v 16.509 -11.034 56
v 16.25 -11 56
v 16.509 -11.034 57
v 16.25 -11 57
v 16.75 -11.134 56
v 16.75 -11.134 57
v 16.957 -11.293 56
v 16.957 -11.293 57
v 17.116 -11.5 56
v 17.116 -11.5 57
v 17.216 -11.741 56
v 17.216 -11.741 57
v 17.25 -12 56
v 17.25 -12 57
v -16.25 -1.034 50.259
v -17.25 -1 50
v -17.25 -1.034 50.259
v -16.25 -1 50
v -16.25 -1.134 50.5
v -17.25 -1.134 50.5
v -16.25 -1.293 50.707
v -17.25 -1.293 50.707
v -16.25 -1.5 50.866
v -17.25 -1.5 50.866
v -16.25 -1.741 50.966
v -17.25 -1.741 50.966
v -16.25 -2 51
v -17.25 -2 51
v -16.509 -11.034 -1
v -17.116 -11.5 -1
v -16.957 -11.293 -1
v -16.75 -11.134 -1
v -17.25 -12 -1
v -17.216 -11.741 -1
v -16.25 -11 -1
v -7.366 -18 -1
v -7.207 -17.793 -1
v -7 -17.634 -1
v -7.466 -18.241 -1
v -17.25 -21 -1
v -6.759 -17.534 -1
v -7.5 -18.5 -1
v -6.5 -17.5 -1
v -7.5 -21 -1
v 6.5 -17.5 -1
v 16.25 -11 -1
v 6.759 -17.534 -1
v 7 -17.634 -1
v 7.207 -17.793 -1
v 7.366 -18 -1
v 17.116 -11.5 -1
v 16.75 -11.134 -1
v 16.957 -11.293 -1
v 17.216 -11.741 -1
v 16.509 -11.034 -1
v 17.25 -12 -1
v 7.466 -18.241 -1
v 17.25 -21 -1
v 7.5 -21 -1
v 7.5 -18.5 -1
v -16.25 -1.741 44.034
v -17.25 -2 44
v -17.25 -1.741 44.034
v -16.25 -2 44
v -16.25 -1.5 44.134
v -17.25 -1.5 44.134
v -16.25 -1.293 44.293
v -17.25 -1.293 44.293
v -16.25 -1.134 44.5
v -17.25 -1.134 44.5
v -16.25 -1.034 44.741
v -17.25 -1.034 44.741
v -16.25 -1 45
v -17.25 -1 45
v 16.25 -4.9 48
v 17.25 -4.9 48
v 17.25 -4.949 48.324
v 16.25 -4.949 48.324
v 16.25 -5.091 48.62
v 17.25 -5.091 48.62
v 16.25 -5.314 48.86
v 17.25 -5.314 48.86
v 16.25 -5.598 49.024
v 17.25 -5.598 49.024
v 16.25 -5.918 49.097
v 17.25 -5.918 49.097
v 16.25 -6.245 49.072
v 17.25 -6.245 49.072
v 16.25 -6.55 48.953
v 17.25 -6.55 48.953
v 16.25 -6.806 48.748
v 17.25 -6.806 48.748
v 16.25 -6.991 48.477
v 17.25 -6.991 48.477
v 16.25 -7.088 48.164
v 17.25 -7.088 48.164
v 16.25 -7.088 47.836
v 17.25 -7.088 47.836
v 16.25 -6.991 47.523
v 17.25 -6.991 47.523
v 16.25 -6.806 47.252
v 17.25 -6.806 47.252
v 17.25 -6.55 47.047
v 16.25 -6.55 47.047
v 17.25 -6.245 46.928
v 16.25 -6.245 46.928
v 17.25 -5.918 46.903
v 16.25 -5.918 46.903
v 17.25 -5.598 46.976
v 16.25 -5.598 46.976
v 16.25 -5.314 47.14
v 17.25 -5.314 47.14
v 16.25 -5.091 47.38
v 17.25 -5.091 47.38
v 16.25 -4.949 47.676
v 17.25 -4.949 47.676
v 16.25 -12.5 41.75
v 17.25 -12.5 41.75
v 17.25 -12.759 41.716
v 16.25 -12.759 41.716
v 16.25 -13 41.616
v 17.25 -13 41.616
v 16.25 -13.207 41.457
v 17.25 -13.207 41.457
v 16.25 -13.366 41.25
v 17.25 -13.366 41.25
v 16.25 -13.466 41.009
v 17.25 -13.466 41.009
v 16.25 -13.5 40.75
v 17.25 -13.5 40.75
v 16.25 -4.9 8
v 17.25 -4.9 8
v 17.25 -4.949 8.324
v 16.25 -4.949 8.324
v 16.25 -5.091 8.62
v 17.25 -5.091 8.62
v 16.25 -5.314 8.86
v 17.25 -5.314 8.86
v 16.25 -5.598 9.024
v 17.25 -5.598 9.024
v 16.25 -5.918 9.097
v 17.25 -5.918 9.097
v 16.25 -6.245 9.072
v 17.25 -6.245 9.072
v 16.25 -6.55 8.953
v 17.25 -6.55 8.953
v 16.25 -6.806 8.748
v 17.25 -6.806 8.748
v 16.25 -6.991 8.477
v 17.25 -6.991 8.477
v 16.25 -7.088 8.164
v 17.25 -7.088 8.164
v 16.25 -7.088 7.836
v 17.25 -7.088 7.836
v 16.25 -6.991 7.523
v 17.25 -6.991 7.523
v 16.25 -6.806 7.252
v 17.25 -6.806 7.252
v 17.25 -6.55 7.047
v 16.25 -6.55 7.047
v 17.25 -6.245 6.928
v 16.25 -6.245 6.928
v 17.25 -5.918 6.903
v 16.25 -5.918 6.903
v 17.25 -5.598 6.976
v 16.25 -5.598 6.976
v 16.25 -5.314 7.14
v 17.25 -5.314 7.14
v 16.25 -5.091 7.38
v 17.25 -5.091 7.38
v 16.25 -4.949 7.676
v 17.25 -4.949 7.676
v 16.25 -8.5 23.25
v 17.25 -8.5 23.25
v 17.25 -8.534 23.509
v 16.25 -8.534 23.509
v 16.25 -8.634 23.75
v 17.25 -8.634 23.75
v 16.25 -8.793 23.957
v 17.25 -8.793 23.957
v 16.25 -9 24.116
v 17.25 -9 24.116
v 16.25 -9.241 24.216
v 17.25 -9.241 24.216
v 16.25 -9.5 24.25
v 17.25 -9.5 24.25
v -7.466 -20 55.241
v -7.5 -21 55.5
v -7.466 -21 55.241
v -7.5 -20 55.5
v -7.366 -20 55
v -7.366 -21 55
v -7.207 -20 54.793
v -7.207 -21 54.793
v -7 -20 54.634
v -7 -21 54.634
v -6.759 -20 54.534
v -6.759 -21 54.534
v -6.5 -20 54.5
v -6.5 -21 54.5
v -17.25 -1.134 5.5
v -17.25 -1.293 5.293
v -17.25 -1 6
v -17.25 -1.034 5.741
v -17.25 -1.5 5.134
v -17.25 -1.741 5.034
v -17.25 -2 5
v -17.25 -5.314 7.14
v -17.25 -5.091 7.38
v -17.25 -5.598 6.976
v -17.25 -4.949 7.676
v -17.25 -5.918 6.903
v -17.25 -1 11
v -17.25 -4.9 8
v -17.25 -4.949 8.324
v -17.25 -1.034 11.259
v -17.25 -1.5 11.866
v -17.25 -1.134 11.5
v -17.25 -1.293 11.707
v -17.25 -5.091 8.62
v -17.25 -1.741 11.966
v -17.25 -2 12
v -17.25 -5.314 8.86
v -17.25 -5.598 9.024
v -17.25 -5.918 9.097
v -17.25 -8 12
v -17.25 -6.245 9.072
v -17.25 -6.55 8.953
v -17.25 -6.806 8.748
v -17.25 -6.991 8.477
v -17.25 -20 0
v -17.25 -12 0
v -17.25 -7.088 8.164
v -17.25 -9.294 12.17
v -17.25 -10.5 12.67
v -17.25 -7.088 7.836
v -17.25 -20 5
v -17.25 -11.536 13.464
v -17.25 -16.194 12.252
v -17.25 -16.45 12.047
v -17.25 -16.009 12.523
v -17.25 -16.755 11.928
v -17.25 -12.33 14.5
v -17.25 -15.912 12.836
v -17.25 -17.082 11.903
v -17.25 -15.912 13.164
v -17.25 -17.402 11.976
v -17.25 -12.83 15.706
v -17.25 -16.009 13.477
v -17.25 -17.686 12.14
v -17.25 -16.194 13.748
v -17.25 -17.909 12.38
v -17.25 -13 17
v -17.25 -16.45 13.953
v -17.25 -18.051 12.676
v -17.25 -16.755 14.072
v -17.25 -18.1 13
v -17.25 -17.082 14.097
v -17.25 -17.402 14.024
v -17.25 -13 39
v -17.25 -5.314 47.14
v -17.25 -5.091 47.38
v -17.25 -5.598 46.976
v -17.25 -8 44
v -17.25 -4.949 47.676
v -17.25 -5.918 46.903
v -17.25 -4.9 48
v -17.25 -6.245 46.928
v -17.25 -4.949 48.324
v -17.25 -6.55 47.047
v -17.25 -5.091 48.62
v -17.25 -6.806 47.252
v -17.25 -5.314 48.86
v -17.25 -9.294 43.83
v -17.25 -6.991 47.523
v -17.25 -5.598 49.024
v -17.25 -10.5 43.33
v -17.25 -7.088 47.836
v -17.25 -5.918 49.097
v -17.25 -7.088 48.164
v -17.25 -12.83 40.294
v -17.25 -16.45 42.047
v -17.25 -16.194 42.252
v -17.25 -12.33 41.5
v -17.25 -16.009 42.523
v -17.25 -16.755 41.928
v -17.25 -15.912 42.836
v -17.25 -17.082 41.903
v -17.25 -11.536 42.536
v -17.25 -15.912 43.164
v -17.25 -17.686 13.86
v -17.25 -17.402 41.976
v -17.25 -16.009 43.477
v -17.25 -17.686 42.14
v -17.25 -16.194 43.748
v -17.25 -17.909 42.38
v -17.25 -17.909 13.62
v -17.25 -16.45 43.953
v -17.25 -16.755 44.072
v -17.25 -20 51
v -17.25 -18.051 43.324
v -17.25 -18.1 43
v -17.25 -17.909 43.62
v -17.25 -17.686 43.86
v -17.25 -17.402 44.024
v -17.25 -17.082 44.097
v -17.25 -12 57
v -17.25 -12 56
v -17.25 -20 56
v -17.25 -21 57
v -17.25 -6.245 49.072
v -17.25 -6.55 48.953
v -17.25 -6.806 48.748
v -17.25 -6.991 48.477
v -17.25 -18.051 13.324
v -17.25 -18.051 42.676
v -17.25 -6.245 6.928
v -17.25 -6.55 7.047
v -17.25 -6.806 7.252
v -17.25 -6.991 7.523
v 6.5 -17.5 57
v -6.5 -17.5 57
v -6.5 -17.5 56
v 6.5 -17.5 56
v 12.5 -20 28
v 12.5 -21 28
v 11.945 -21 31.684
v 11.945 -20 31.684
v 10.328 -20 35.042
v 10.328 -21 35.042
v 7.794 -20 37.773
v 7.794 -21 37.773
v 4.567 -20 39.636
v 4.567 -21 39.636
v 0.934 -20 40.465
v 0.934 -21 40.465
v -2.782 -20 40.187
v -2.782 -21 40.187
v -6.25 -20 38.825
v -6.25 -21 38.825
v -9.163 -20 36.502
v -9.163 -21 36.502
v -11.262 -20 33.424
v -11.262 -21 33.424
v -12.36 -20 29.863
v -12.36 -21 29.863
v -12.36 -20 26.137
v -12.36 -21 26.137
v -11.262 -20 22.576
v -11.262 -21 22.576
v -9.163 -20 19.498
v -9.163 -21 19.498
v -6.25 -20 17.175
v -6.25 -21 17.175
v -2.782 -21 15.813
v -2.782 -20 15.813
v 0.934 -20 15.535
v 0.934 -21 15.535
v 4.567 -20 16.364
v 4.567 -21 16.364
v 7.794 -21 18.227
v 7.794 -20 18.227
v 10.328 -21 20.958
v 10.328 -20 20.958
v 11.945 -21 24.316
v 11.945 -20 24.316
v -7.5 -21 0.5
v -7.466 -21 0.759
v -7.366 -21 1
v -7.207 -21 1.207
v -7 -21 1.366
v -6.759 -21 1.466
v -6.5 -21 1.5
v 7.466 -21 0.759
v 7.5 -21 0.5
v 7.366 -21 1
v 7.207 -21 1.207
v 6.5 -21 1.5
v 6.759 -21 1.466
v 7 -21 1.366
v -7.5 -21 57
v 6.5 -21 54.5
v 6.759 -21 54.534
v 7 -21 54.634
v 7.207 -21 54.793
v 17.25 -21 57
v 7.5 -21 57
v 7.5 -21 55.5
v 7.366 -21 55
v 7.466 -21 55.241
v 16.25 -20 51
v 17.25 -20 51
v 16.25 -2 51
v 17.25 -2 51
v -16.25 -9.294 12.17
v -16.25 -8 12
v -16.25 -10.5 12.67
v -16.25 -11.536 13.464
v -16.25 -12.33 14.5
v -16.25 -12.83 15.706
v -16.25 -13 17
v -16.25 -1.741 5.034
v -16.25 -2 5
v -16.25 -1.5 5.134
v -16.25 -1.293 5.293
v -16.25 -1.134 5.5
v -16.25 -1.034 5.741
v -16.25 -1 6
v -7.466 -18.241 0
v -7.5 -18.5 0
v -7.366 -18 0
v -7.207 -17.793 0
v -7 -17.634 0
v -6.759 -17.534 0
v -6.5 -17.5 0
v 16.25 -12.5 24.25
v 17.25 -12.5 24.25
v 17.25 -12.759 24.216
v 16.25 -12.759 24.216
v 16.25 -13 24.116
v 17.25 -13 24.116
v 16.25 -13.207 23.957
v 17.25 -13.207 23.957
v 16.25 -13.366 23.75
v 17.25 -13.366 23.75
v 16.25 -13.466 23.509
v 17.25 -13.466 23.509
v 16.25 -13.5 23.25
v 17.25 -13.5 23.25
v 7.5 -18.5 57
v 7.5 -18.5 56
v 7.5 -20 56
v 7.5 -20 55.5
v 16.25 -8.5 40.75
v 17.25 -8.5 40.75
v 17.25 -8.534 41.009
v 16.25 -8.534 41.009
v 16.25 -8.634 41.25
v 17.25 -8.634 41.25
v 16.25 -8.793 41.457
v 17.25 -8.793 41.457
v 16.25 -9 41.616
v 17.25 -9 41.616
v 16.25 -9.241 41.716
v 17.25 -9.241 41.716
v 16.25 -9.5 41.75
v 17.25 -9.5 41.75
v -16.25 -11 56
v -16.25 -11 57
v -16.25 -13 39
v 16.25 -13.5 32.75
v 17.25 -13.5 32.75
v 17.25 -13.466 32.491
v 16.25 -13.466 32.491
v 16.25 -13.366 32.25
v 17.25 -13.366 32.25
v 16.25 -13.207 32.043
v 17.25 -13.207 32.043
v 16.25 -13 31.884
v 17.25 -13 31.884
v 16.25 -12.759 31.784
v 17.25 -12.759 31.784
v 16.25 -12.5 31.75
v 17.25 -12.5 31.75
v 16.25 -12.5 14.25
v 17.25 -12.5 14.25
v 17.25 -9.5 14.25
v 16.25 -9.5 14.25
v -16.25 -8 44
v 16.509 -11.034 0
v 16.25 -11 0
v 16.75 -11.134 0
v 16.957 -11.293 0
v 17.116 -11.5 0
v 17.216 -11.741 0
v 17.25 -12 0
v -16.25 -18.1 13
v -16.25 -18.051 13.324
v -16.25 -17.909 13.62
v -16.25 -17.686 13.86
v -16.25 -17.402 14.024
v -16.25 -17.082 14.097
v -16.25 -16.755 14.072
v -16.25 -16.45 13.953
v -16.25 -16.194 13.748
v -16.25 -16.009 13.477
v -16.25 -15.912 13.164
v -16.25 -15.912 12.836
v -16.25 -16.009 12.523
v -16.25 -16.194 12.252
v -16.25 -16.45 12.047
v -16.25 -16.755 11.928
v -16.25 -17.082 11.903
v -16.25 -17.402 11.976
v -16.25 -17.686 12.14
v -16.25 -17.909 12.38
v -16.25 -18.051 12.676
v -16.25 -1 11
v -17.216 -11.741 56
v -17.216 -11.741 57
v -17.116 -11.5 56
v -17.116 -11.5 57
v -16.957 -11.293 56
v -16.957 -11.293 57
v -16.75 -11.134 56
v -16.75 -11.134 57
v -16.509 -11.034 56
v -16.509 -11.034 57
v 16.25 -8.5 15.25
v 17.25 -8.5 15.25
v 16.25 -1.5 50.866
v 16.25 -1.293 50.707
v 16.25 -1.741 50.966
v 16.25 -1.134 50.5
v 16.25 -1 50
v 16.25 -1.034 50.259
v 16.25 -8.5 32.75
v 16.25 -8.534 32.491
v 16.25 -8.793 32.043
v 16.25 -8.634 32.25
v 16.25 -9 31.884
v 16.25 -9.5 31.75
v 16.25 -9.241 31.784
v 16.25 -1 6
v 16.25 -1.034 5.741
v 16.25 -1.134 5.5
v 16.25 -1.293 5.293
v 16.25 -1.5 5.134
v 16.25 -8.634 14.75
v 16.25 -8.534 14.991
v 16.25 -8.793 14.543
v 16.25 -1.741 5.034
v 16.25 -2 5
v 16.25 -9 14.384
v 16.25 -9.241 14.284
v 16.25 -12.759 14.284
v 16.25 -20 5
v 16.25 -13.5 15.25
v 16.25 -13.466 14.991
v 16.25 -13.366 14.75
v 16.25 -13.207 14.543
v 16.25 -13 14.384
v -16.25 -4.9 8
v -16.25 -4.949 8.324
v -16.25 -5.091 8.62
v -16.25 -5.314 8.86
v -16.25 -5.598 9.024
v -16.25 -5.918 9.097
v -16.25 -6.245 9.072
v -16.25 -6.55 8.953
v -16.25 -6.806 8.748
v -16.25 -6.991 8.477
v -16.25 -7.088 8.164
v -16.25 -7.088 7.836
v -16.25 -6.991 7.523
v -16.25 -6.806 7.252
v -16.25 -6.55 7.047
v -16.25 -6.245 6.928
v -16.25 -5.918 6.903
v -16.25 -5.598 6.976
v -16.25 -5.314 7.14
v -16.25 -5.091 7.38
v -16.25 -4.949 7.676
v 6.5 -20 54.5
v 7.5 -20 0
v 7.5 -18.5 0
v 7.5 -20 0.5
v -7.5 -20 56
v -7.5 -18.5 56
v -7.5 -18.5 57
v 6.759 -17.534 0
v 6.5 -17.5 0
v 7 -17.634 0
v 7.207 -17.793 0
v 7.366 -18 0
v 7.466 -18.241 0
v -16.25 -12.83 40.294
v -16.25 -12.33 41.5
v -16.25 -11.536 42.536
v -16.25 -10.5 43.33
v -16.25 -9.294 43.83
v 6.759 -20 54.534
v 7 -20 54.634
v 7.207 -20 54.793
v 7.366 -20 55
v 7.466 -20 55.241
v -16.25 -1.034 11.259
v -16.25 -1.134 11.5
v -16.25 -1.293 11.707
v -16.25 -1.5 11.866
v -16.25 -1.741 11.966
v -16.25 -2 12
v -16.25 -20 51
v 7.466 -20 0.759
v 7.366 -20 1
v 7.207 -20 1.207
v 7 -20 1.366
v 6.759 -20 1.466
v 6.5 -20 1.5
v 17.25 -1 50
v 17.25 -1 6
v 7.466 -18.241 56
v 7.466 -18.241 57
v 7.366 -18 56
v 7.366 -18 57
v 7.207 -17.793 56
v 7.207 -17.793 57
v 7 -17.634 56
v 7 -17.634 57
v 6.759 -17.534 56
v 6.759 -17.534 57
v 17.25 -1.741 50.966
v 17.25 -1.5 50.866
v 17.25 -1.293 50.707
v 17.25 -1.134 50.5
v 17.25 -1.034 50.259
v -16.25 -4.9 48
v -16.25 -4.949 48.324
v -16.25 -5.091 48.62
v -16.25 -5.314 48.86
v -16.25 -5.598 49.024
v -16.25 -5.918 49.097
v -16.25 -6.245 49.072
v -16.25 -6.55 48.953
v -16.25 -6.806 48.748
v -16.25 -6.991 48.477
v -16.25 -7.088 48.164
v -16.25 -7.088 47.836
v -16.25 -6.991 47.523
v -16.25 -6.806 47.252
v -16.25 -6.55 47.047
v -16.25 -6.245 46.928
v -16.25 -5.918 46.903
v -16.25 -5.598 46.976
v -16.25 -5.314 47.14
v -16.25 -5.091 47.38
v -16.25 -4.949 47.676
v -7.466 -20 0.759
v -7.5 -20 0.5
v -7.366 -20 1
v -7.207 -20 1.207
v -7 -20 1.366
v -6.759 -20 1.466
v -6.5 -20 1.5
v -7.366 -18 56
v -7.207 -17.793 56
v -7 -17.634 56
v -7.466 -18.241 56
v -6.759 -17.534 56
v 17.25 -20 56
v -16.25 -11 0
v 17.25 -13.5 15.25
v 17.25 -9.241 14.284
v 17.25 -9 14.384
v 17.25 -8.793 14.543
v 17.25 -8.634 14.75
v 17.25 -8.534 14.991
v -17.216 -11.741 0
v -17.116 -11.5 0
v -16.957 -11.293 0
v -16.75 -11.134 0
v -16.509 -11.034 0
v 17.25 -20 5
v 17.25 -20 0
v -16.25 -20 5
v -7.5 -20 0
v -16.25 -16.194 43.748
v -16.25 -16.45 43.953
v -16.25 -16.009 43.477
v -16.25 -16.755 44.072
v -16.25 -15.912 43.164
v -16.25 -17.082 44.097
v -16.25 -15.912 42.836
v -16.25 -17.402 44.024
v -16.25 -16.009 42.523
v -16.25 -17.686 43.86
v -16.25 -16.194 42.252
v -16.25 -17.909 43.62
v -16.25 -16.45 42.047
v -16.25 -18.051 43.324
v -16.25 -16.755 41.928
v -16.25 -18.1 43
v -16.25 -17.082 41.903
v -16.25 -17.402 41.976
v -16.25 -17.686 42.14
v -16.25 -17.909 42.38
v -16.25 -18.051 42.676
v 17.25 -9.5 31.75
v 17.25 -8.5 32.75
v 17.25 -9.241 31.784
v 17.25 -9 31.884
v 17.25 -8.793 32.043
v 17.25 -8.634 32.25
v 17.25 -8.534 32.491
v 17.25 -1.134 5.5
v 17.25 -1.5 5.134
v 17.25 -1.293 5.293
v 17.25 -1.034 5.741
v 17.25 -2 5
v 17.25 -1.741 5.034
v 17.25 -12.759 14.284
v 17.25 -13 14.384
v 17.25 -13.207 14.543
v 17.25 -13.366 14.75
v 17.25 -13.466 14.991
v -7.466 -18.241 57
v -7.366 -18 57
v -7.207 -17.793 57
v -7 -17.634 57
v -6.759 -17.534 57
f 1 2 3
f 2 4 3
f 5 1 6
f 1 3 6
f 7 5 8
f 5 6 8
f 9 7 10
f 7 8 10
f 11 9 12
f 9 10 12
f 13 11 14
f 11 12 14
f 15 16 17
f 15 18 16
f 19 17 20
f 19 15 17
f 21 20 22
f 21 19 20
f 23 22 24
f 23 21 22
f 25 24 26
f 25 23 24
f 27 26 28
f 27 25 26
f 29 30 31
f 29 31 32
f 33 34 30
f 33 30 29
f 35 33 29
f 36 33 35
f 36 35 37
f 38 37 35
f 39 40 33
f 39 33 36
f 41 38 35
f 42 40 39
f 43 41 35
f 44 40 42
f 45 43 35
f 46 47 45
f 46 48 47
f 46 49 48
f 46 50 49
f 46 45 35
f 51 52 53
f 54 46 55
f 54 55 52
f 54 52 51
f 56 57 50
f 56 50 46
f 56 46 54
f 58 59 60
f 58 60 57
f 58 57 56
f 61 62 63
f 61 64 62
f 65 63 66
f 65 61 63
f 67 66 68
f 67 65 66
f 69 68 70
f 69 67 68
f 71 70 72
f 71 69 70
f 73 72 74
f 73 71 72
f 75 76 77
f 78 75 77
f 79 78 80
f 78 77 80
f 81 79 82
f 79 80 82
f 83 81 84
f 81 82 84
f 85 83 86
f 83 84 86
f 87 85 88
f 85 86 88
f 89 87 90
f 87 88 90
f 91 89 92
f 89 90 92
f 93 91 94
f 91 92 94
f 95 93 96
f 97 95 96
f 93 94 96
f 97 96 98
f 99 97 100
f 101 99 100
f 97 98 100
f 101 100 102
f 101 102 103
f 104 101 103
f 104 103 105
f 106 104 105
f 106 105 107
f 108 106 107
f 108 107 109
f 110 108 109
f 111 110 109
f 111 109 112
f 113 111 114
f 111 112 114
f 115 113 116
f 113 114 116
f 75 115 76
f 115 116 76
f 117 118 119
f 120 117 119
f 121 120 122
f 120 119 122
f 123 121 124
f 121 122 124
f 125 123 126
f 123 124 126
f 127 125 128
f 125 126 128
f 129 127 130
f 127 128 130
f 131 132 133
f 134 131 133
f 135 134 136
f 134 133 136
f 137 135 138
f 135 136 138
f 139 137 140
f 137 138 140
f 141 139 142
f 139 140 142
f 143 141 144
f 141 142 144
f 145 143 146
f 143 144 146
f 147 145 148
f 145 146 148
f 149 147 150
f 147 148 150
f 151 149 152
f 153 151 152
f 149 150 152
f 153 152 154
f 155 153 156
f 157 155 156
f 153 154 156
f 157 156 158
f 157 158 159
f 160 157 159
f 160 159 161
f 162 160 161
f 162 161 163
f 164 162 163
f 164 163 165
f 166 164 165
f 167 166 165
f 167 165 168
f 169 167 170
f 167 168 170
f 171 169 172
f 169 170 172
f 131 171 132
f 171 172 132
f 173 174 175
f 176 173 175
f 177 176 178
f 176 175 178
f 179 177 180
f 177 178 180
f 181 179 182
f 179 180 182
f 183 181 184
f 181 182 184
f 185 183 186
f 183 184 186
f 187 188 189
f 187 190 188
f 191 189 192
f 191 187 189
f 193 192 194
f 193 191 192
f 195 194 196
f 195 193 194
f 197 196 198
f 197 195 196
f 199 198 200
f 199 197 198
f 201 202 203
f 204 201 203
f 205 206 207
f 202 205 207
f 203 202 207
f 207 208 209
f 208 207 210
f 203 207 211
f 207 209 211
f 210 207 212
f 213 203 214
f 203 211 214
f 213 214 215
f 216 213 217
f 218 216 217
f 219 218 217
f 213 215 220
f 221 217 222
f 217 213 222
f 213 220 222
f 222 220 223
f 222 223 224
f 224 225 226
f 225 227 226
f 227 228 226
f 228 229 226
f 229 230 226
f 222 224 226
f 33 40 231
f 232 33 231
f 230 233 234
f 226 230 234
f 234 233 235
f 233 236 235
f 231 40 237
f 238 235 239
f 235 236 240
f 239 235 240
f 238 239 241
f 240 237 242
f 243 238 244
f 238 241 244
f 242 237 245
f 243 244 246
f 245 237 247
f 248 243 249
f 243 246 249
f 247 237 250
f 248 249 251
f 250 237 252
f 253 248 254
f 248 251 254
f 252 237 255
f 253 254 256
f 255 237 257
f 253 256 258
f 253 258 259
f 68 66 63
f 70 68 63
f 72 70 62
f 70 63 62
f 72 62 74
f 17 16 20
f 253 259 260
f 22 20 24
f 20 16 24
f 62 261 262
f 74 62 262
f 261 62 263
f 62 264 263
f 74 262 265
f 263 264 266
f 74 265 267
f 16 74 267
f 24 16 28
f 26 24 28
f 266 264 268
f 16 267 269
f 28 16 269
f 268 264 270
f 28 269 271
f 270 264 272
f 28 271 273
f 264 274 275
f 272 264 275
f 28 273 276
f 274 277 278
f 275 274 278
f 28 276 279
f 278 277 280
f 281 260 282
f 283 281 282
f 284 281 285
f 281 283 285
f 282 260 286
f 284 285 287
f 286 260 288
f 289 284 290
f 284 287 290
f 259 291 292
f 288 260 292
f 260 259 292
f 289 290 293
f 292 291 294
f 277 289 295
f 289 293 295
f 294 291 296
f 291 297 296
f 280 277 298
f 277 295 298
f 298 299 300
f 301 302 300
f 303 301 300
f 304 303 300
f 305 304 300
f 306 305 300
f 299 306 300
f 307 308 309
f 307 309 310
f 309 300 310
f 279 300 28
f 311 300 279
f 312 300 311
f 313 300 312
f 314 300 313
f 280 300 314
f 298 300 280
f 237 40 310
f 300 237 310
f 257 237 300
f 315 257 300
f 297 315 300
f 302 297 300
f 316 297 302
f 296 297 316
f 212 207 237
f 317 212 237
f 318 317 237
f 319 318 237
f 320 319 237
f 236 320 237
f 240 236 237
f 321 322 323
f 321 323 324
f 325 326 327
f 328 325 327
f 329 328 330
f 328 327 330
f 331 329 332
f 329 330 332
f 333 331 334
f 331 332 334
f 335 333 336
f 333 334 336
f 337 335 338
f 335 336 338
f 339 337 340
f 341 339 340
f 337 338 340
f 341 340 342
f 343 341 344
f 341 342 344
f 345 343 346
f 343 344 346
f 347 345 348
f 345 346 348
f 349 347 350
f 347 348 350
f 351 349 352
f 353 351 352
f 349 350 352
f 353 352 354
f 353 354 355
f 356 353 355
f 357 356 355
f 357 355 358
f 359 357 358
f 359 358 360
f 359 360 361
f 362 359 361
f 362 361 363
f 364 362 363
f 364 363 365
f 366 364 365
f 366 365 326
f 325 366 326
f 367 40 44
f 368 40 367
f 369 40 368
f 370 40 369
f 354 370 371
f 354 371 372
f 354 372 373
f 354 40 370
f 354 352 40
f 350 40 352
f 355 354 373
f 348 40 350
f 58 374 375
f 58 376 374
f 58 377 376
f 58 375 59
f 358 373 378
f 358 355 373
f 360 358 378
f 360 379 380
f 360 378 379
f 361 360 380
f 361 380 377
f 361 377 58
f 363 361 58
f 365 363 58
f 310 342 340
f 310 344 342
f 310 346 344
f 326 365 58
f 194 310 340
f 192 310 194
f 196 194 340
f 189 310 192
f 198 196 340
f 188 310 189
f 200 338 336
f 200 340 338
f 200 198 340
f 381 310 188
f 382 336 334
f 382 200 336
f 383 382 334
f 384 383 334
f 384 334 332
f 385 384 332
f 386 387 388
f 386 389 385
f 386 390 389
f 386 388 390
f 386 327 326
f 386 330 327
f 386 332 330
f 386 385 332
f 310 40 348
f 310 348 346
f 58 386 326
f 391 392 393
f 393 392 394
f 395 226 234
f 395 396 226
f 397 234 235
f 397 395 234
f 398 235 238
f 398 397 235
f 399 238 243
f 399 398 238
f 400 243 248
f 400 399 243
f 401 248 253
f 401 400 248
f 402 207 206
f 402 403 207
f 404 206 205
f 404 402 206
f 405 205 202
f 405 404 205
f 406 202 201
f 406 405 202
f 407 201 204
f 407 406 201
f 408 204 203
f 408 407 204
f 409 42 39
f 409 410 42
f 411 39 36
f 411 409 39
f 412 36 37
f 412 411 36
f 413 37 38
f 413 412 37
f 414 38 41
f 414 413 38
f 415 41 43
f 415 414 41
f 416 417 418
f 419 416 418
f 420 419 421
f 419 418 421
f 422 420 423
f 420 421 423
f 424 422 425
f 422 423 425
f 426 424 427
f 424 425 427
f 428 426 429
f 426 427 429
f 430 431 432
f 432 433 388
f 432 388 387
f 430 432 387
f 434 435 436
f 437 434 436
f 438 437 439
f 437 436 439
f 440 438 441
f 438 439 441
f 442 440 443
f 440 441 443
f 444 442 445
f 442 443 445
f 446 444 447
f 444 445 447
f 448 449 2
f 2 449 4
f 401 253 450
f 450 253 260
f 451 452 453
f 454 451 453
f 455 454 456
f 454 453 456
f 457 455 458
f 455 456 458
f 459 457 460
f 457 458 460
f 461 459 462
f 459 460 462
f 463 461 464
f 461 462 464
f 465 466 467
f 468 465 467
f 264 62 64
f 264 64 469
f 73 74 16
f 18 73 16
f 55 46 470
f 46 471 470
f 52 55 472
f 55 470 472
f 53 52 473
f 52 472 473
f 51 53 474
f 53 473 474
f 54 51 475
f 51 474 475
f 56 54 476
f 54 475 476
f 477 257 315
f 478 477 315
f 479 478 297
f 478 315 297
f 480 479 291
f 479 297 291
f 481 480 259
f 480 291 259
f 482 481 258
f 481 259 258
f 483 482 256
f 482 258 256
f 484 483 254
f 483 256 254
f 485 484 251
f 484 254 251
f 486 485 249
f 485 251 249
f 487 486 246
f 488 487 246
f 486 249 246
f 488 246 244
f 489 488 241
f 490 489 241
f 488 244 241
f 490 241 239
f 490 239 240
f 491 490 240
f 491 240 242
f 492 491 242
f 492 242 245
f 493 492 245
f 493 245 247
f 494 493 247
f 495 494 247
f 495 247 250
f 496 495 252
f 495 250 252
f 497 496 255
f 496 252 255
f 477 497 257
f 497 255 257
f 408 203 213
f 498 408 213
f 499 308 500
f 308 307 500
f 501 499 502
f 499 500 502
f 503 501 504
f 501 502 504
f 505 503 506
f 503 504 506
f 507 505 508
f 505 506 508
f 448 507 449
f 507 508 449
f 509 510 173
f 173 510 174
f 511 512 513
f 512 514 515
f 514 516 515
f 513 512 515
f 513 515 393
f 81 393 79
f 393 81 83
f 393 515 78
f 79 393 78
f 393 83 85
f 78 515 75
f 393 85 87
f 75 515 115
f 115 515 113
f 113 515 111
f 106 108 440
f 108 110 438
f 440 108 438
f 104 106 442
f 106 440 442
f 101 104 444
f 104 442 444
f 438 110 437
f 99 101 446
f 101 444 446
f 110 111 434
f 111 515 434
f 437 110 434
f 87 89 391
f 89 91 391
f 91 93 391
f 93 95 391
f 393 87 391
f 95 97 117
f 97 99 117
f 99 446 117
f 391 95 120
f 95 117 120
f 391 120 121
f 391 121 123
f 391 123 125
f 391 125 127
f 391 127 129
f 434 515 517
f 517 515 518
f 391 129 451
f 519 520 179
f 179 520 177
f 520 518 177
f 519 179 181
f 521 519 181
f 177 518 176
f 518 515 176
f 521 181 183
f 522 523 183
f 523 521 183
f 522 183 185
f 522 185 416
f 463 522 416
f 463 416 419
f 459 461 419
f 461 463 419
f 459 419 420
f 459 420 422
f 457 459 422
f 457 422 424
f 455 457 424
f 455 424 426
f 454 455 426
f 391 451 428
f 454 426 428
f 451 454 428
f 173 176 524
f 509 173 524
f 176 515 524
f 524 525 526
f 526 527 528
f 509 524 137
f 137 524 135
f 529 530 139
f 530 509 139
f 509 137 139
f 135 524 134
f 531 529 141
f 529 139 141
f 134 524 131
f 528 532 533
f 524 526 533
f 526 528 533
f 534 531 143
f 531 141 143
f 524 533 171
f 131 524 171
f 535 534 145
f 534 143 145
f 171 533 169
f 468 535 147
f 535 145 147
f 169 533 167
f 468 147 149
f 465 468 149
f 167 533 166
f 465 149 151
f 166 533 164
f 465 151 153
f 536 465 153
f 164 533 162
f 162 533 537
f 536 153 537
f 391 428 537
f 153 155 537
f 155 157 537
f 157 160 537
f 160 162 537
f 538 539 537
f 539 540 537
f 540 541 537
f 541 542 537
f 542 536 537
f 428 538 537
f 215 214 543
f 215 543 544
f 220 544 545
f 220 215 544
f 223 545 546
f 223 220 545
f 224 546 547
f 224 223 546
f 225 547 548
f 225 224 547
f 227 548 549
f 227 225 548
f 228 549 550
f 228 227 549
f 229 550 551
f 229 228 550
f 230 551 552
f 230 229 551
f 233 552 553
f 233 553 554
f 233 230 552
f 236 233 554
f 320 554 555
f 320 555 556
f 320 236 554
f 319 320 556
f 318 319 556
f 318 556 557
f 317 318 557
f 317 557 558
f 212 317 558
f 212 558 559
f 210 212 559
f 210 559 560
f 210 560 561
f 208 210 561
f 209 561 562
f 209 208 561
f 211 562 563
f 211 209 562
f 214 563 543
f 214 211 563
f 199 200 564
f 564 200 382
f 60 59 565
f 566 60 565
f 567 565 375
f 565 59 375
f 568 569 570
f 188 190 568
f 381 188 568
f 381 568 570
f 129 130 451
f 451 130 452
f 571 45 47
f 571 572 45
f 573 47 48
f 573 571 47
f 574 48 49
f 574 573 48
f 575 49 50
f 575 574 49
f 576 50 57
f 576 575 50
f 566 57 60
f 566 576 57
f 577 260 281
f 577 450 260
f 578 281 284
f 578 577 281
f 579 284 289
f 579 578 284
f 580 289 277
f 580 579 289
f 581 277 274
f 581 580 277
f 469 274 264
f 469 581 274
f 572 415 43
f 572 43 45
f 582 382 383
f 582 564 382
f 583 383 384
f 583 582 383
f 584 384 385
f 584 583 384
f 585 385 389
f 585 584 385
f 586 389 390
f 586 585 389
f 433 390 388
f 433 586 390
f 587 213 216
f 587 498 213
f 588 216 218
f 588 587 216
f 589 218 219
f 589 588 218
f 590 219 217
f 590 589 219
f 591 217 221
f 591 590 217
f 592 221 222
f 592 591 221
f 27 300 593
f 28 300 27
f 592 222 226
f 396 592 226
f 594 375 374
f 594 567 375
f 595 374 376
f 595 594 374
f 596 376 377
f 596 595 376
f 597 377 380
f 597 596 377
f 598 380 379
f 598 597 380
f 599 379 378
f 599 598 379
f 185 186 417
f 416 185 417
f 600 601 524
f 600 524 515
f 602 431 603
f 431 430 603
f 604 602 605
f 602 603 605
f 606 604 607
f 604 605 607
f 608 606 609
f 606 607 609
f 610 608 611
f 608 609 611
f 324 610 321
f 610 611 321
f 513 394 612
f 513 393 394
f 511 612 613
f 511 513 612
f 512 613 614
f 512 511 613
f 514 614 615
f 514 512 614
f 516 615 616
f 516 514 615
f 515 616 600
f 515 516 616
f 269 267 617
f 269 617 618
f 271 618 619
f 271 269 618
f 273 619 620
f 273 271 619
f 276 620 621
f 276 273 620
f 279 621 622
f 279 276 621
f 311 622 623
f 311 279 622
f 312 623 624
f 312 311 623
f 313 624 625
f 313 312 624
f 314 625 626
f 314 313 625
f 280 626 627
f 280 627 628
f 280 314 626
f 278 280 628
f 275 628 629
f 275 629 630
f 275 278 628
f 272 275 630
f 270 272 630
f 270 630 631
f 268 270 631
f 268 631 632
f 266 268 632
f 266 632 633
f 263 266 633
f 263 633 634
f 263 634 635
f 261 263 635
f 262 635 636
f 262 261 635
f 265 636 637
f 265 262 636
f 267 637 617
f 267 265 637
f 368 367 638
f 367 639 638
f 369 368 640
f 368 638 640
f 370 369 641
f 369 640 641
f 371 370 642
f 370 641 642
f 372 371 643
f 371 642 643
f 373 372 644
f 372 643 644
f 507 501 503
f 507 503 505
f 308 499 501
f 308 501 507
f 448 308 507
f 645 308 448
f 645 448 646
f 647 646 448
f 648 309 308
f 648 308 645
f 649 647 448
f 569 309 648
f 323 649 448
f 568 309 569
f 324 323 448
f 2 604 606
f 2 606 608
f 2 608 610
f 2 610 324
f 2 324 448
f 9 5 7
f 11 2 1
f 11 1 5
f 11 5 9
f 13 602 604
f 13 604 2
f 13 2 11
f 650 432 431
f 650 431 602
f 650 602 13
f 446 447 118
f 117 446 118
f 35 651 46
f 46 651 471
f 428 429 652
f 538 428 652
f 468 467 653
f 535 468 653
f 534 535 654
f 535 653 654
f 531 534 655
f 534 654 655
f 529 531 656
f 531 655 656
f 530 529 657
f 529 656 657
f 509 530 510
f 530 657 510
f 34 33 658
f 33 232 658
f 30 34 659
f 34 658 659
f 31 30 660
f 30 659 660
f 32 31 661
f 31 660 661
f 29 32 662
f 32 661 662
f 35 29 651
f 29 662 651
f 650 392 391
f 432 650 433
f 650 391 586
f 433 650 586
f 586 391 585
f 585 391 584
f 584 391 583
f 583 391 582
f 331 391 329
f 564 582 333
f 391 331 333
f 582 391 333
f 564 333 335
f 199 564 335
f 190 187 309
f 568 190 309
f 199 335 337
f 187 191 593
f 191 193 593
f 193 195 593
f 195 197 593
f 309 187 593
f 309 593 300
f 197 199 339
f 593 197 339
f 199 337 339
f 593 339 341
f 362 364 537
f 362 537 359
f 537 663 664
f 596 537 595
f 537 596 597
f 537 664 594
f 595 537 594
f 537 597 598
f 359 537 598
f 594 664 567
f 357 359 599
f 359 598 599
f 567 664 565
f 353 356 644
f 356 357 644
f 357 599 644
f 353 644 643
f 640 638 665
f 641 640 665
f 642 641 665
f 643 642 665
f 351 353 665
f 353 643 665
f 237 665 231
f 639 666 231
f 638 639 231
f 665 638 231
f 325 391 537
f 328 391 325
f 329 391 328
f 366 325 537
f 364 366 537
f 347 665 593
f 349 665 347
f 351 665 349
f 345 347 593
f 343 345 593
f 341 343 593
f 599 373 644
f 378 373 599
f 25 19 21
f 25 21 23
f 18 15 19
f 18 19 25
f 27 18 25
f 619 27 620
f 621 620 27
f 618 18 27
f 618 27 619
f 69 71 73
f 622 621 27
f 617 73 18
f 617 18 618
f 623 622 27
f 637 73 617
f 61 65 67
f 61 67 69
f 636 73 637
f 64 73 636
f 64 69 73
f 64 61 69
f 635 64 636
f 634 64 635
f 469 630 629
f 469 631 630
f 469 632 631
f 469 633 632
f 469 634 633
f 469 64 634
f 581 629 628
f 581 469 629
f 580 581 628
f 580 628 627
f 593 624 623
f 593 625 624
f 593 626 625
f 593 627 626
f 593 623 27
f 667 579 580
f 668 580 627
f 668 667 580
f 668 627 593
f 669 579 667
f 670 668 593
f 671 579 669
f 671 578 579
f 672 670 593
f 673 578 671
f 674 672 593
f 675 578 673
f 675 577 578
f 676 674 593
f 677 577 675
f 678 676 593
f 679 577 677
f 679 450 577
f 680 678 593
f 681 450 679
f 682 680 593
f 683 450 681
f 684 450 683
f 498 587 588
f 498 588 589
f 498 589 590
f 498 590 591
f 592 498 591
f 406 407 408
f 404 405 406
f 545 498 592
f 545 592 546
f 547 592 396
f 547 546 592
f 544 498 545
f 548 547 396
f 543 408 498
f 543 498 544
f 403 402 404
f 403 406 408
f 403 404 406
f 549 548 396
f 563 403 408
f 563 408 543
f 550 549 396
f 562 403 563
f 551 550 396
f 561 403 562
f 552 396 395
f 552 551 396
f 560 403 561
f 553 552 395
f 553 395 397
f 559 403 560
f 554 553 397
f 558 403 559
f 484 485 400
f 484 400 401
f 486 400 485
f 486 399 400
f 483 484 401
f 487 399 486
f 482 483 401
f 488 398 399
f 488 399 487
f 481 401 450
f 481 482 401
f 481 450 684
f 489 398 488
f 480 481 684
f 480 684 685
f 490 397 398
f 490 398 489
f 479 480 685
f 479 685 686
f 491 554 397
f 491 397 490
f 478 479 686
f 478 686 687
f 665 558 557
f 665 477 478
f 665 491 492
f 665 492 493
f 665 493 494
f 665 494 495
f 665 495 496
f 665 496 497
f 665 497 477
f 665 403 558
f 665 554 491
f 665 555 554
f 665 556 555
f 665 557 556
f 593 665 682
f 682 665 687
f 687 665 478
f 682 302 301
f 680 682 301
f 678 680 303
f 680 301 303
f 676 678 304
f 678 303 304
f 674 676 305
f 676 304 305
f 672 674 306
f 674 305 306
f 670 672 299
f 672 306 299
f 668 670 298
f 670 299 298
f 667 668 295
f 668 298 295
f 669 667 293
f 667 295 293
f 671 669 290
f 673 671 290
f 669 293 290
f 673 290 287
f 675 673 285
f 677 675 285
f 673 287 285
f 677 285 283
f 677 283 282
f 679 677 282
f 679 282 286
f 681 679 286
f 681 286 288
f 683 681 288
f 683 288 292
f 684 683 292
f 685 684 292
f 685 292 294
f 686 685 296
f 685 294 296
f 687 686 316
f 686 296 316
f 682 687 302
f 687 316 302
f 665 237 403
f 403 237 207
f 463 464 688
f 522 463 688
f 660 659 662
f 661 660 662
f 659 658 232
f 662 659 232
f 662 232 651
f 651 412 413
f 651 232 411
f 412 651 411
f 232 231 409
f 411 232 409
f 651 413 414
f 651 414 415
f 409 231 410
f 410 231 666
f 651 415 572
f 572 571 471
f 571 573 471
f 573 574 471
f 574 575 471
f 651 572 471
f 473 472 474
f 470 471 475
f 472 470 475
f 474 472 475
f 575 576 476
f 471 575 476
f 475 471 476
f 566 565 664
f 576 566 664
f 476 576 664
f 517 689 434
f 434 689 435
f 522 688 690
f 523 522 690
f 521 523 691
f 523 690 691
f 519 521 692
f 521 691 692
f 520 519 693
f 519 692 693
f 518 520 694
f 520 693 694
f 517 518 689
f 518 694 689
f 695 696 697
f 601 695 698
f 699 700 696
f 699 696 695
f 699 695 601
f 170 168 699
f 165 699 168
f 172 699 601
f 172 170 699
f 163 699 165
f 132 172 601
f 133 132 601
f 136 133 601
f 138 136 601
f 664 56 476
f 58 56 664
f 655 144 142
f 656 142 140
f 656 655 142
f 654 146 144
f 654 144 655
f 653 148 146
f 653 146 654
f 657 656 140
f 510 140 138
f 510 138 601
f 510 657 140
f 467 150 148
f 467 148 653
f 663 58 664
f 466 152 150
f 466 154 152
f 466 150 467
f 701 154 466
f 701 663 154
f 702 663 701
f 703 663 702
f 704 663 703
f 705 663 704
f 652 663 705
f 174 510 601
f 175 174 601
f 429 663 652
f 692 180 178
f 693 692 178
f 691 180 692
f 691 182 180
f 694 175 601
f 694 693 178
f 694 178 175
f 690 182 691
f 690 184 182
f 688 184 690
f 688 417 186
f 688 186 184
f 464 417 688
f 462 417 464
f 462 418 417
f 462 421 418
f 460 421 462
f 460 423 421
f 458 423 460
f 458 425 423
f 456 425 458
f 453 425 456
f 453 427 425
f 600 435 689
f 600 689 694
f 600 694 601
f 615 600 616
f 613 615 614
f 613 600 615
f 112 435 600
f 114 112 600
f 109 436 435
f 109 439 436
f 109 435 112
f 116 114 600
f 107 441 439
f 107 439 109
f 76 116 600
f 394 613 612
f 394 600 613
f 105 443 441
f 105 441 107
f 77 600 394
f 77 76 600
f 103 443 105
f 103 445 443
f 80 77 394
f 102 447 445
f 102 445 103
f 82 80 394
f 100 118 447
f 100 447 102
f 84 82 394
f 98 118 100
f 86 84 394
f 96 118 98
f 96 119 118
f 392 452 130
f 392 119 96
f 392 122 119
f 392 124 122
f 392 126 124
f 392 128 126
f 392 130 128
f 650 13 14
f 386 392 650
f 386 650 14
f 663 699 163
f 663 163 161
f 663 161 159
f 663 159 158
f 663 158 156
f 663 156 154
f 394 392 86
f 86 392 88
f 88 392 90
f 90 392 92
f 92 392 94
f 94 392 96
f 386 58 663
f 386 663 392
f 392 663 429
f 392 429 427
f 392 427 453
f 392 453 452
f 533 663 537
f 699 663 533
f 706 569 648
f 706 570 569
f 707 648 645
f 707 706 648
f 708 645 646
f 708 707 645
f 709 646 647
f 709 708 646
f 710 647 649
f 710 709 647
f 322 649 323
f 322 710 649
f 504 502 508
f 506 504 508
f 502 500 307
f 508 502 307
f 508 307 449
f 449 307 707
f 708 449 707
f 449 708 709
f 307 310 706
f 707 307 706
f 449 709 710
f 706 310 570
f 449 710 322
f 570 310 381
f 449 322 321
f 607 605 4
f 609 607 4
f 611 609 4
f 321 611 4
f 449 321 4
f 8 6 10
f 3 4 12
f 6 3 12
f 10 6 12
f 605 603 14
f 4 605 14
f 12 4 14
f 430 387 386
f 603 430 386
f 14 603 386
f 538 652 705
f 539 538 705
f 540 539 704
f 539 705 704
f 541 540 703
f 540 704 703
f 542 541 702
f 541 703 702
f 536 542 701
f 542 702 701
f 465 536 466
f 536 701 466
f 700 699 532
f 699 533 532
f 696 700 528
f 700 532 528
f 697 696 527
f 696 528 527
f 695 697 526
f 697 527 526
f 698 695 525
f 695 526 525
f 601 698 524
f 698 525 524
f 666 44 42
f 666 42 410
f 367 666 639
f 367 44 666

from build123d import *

# Parameters (mm, degrees)
F1_DEPTH  = 56
F2_W      = 4
F2_H      = 38
F2_R      = 1.1
F2_R_2    = 12.5
F3_DEPTH  = 1
F4_W      = 21
F4_H      = 56
F4_R      = 1.1
F5_DEPTH  = 1
F6_W      = 20
F6_H      = 5
F7_DEPTH  = 1
F8_W      = 36
F8_H      = 38
F9_DEPTH  = 1
F11_R     = 1.1
F11_W     = 12
F11_H     = 32
F12_DEPTH = 1
F13_W     = 34.5
F13_H     = 1
F14_DEPTH = 10
F15_R     = 12.5
F15_W     = 15
F15_H     = 5
F16_DEPTH = 3.5
F18_DEPTH = 1
F19_R     = 1
F20_R     = 5


with BuildPart() as f1:
    # F0 (on Top) → F1 (new body)
    with BuildSketch(Plane.XY):
        Polygon((16.25, -20), (-16.25, -20), (-16.25, 20), (-17.25, 20), (-17.25, -21), (17.25, -21), (17.25, 20), (16.25, 20), align=None)
    extrude(amount=F1_DEPTH)

    # F2 (on face) → F3 (cut, through all)
    with BuildSketch(Plane(origin=(-17.25, 0, 0), x_dir=(0, -1, 0), z_dir=(-1, 0, 0))):
        Polygon((-20, 0), (20, 0), (20, 9), (-16, 9), (-20, 9), align=None)
        with Locations((-18, 28)):
            Rectangle(F2_W, F2_H)
        Polygon((-20, 56), (-20, 47), (-16, 47), (20, 47), (20, 56), align=None)
        with Locations((18, 43)):
            Circle(F2_R)
        with Locations((-12, 43)):
            Circle(F2_R)
        with Locations((-12, 13)):
            Circle(F2_R)
        with Locations((18, 13)):
            Circle(F2_R)
        with Locations((3, 28)):
            Circle(F2_R_2)
    extrude(amount=-F3_DEPTH, mode=Mode.SUBTRACT)

    # F4 (on face) → F5 (cut, through all)
    with BuildSketch(Plane.YZ.offset(17.25)):
        with Locations((9.5, 28)):
            Rectangle(F4_W, F4_H)
        with Locations((-6, 8)):
            Circle(F4_R)
        with Locations((-6, 48)):
            Circle(F4_R)
    extrude(amount=-F5_DEPTH, mode=Mode.SUBTRACT)

    # F6 (on face) → F7 (cut)
    with BuildSketch(Plane.YZ.offset(17.25)):
        with Locations((-11, 2.5)):
            Rectangle(F6_W, F6_H)
        with Locations((-11, 53.5)):
            Rectangle(F6_W, F6_H)
    extrude(amount=-F7_DEPTH, mode=Mode.SUBTRACT)

    # F8 (on face) → F9 (cut)
    with BuildSketch(Plane(origin=(-17.25, 0, 0), x_dir=(0, -1, 0), z_dir=(-1, 0, 0))):
        with Locations((2, 28)):
            Rectangle(F8_W, F8_H)
    extrude(amount=-F9_DEPTH, mode=Mode.SUBTRACT)

    # F10: F1 across plane


with BuildPart() as f1_1:
    add(f1.part)
    add(f1.part.mirror(Plane.YZ))

    # F11 (on face) → F12 (cut, through all)
    with BuildSketch(Plane(origin=(-17.25, 0, 0), x_dir=(0, -1, 0), z_dir=(-1, 0, 0))):
        with Locations((17, 43)):
            Circle(F11_R)
        with Locations((17, 13)):
            Circle(F11_R)
        with Locations((7, 28)):
            Rectangle(F11_W, F11_H)
    extrude(amount=-F12_DEPTH, mode=Mode.SUBTRACT)

    # F13 (on face) → F14 (join)
    with BuildSketch(Plane.XZ.offset(21)):
        with Locations((0, -0.5)):
            Rectangle(F13_W, F13_H)
        with Locations((0, 56.5)):
            Rectangle(F13_W, F13_H)
    extrude(amount=-F14_DEPTH)

    # F15 (on face) → F16 (cut)
    with BuildSketch(Plane.XZ.offset(21)):
        with Locations((0, 28)):
            Circle(F15_R)
        with Locations((0, 57)):
            Rectangle(F15_W, F15_H)
        with Locations((0, -1)):
            Rectangle(F15_W, F15_H)
    extrude(amount=-F16_DEPTH, mode=Mode.SUBTRACT)

    # F17 (on face) → F18 (cut, through all)
    with BuildSketch(Plane.YZ.offset(17.25)):
        with BuildLine():
            ThreePointArc((-13.5, 15.25), (-13.2071067812, 14.5428932188), (-12.5, 14.25))
            Line((-12.5, 14.25), (-9.5, 14.25))
            ThreePointArc((-9.5, 14.25), (-8.7928932188, 14.5428932188), (-8.5, 15.25))
            Line((-8.5, 15.25), (-8.5, 23.25))
            ThreePointArc((-8.5, 23.25), (-8.7928932188, 23.9571067812), (-9.5, 24.25))
            Line((-9.5, 24.25), (-12.5, 24.25))
            ThreePointArc((-12.5, 24.25), (-13.2071067812, 23.9571067812), (-13.5, 23.25))
            Line((-13.5, 23.25), (-13.5, 15.25))
        make_face()
        with BuildLine():
            ThreePointArc((-12.5, 41.75), (-13.2071067812, 41.4571067812), (-13.5, 40.75))
            Line((-13.5, 40.75), (-13.5, 32.75))
            ThreePointArc((-13.5, 32.75), (-13.2071067812, 32.0428932188), (-12.5, 31.75))
            Line((-12.5, 31.75), (-9.5, 31.75))
            ThreePointArc((-9.5, 31.75), (-8.7928932188, 32.0428932188), (-8.5, 32.75))
            Line((-8.5, 32.75), (-8.5, 40.75))
            ThreePointArc((-8.5, 40.75), (-8.7928932188, 41.4571067812), (-9.5, 41.75))
            Line((-9.5, 41.75), (-12.5, 41.75))
        make_face()
    extrude(amount=-F18_DEPTH, mode=Mode.SUBTRACT)

    # F19
    f19_edges = [f1_1.edges().sort_by_distance(p)[0] for p in [
        (-17.25, -11, 56.5),
        (17.25, -11, 56.5),
        (16.75, -1, 51),
        (16.75, -1, 5),
        (-16.75, -1, 5),
        (-16.75, -1, 12),
        (-16.75, -1, 51),
        (-16.75, -1, 44),
        (-17.25, -11, -0.5),
        (17.25, -11, -0.5),
        (7.5, -20.5, 1.5),
        (7.5, -17.5, -0.5),
        (-7.5, -20.5, 1.5),
        (-7.5, -17.5, -0.5),
        (7.5, -20.5, 54.5),
        (7.5, -17.5, 56.5),
        (-7.5, -17.5, 56.5),
        (-7.5, -20.5, 54.5),
    ]]
    fillet(f19_edges, radius=F19_R)

    # F20
    f20_edges = [f1_1.edges().sort_by_distance(p)[0] for p in [
        (-16.75, -13, 44),
        (-16.75, -13, 12),
    ]]
    fillet(f20_edges, radius=F20_R)


solid = f1_1.part
